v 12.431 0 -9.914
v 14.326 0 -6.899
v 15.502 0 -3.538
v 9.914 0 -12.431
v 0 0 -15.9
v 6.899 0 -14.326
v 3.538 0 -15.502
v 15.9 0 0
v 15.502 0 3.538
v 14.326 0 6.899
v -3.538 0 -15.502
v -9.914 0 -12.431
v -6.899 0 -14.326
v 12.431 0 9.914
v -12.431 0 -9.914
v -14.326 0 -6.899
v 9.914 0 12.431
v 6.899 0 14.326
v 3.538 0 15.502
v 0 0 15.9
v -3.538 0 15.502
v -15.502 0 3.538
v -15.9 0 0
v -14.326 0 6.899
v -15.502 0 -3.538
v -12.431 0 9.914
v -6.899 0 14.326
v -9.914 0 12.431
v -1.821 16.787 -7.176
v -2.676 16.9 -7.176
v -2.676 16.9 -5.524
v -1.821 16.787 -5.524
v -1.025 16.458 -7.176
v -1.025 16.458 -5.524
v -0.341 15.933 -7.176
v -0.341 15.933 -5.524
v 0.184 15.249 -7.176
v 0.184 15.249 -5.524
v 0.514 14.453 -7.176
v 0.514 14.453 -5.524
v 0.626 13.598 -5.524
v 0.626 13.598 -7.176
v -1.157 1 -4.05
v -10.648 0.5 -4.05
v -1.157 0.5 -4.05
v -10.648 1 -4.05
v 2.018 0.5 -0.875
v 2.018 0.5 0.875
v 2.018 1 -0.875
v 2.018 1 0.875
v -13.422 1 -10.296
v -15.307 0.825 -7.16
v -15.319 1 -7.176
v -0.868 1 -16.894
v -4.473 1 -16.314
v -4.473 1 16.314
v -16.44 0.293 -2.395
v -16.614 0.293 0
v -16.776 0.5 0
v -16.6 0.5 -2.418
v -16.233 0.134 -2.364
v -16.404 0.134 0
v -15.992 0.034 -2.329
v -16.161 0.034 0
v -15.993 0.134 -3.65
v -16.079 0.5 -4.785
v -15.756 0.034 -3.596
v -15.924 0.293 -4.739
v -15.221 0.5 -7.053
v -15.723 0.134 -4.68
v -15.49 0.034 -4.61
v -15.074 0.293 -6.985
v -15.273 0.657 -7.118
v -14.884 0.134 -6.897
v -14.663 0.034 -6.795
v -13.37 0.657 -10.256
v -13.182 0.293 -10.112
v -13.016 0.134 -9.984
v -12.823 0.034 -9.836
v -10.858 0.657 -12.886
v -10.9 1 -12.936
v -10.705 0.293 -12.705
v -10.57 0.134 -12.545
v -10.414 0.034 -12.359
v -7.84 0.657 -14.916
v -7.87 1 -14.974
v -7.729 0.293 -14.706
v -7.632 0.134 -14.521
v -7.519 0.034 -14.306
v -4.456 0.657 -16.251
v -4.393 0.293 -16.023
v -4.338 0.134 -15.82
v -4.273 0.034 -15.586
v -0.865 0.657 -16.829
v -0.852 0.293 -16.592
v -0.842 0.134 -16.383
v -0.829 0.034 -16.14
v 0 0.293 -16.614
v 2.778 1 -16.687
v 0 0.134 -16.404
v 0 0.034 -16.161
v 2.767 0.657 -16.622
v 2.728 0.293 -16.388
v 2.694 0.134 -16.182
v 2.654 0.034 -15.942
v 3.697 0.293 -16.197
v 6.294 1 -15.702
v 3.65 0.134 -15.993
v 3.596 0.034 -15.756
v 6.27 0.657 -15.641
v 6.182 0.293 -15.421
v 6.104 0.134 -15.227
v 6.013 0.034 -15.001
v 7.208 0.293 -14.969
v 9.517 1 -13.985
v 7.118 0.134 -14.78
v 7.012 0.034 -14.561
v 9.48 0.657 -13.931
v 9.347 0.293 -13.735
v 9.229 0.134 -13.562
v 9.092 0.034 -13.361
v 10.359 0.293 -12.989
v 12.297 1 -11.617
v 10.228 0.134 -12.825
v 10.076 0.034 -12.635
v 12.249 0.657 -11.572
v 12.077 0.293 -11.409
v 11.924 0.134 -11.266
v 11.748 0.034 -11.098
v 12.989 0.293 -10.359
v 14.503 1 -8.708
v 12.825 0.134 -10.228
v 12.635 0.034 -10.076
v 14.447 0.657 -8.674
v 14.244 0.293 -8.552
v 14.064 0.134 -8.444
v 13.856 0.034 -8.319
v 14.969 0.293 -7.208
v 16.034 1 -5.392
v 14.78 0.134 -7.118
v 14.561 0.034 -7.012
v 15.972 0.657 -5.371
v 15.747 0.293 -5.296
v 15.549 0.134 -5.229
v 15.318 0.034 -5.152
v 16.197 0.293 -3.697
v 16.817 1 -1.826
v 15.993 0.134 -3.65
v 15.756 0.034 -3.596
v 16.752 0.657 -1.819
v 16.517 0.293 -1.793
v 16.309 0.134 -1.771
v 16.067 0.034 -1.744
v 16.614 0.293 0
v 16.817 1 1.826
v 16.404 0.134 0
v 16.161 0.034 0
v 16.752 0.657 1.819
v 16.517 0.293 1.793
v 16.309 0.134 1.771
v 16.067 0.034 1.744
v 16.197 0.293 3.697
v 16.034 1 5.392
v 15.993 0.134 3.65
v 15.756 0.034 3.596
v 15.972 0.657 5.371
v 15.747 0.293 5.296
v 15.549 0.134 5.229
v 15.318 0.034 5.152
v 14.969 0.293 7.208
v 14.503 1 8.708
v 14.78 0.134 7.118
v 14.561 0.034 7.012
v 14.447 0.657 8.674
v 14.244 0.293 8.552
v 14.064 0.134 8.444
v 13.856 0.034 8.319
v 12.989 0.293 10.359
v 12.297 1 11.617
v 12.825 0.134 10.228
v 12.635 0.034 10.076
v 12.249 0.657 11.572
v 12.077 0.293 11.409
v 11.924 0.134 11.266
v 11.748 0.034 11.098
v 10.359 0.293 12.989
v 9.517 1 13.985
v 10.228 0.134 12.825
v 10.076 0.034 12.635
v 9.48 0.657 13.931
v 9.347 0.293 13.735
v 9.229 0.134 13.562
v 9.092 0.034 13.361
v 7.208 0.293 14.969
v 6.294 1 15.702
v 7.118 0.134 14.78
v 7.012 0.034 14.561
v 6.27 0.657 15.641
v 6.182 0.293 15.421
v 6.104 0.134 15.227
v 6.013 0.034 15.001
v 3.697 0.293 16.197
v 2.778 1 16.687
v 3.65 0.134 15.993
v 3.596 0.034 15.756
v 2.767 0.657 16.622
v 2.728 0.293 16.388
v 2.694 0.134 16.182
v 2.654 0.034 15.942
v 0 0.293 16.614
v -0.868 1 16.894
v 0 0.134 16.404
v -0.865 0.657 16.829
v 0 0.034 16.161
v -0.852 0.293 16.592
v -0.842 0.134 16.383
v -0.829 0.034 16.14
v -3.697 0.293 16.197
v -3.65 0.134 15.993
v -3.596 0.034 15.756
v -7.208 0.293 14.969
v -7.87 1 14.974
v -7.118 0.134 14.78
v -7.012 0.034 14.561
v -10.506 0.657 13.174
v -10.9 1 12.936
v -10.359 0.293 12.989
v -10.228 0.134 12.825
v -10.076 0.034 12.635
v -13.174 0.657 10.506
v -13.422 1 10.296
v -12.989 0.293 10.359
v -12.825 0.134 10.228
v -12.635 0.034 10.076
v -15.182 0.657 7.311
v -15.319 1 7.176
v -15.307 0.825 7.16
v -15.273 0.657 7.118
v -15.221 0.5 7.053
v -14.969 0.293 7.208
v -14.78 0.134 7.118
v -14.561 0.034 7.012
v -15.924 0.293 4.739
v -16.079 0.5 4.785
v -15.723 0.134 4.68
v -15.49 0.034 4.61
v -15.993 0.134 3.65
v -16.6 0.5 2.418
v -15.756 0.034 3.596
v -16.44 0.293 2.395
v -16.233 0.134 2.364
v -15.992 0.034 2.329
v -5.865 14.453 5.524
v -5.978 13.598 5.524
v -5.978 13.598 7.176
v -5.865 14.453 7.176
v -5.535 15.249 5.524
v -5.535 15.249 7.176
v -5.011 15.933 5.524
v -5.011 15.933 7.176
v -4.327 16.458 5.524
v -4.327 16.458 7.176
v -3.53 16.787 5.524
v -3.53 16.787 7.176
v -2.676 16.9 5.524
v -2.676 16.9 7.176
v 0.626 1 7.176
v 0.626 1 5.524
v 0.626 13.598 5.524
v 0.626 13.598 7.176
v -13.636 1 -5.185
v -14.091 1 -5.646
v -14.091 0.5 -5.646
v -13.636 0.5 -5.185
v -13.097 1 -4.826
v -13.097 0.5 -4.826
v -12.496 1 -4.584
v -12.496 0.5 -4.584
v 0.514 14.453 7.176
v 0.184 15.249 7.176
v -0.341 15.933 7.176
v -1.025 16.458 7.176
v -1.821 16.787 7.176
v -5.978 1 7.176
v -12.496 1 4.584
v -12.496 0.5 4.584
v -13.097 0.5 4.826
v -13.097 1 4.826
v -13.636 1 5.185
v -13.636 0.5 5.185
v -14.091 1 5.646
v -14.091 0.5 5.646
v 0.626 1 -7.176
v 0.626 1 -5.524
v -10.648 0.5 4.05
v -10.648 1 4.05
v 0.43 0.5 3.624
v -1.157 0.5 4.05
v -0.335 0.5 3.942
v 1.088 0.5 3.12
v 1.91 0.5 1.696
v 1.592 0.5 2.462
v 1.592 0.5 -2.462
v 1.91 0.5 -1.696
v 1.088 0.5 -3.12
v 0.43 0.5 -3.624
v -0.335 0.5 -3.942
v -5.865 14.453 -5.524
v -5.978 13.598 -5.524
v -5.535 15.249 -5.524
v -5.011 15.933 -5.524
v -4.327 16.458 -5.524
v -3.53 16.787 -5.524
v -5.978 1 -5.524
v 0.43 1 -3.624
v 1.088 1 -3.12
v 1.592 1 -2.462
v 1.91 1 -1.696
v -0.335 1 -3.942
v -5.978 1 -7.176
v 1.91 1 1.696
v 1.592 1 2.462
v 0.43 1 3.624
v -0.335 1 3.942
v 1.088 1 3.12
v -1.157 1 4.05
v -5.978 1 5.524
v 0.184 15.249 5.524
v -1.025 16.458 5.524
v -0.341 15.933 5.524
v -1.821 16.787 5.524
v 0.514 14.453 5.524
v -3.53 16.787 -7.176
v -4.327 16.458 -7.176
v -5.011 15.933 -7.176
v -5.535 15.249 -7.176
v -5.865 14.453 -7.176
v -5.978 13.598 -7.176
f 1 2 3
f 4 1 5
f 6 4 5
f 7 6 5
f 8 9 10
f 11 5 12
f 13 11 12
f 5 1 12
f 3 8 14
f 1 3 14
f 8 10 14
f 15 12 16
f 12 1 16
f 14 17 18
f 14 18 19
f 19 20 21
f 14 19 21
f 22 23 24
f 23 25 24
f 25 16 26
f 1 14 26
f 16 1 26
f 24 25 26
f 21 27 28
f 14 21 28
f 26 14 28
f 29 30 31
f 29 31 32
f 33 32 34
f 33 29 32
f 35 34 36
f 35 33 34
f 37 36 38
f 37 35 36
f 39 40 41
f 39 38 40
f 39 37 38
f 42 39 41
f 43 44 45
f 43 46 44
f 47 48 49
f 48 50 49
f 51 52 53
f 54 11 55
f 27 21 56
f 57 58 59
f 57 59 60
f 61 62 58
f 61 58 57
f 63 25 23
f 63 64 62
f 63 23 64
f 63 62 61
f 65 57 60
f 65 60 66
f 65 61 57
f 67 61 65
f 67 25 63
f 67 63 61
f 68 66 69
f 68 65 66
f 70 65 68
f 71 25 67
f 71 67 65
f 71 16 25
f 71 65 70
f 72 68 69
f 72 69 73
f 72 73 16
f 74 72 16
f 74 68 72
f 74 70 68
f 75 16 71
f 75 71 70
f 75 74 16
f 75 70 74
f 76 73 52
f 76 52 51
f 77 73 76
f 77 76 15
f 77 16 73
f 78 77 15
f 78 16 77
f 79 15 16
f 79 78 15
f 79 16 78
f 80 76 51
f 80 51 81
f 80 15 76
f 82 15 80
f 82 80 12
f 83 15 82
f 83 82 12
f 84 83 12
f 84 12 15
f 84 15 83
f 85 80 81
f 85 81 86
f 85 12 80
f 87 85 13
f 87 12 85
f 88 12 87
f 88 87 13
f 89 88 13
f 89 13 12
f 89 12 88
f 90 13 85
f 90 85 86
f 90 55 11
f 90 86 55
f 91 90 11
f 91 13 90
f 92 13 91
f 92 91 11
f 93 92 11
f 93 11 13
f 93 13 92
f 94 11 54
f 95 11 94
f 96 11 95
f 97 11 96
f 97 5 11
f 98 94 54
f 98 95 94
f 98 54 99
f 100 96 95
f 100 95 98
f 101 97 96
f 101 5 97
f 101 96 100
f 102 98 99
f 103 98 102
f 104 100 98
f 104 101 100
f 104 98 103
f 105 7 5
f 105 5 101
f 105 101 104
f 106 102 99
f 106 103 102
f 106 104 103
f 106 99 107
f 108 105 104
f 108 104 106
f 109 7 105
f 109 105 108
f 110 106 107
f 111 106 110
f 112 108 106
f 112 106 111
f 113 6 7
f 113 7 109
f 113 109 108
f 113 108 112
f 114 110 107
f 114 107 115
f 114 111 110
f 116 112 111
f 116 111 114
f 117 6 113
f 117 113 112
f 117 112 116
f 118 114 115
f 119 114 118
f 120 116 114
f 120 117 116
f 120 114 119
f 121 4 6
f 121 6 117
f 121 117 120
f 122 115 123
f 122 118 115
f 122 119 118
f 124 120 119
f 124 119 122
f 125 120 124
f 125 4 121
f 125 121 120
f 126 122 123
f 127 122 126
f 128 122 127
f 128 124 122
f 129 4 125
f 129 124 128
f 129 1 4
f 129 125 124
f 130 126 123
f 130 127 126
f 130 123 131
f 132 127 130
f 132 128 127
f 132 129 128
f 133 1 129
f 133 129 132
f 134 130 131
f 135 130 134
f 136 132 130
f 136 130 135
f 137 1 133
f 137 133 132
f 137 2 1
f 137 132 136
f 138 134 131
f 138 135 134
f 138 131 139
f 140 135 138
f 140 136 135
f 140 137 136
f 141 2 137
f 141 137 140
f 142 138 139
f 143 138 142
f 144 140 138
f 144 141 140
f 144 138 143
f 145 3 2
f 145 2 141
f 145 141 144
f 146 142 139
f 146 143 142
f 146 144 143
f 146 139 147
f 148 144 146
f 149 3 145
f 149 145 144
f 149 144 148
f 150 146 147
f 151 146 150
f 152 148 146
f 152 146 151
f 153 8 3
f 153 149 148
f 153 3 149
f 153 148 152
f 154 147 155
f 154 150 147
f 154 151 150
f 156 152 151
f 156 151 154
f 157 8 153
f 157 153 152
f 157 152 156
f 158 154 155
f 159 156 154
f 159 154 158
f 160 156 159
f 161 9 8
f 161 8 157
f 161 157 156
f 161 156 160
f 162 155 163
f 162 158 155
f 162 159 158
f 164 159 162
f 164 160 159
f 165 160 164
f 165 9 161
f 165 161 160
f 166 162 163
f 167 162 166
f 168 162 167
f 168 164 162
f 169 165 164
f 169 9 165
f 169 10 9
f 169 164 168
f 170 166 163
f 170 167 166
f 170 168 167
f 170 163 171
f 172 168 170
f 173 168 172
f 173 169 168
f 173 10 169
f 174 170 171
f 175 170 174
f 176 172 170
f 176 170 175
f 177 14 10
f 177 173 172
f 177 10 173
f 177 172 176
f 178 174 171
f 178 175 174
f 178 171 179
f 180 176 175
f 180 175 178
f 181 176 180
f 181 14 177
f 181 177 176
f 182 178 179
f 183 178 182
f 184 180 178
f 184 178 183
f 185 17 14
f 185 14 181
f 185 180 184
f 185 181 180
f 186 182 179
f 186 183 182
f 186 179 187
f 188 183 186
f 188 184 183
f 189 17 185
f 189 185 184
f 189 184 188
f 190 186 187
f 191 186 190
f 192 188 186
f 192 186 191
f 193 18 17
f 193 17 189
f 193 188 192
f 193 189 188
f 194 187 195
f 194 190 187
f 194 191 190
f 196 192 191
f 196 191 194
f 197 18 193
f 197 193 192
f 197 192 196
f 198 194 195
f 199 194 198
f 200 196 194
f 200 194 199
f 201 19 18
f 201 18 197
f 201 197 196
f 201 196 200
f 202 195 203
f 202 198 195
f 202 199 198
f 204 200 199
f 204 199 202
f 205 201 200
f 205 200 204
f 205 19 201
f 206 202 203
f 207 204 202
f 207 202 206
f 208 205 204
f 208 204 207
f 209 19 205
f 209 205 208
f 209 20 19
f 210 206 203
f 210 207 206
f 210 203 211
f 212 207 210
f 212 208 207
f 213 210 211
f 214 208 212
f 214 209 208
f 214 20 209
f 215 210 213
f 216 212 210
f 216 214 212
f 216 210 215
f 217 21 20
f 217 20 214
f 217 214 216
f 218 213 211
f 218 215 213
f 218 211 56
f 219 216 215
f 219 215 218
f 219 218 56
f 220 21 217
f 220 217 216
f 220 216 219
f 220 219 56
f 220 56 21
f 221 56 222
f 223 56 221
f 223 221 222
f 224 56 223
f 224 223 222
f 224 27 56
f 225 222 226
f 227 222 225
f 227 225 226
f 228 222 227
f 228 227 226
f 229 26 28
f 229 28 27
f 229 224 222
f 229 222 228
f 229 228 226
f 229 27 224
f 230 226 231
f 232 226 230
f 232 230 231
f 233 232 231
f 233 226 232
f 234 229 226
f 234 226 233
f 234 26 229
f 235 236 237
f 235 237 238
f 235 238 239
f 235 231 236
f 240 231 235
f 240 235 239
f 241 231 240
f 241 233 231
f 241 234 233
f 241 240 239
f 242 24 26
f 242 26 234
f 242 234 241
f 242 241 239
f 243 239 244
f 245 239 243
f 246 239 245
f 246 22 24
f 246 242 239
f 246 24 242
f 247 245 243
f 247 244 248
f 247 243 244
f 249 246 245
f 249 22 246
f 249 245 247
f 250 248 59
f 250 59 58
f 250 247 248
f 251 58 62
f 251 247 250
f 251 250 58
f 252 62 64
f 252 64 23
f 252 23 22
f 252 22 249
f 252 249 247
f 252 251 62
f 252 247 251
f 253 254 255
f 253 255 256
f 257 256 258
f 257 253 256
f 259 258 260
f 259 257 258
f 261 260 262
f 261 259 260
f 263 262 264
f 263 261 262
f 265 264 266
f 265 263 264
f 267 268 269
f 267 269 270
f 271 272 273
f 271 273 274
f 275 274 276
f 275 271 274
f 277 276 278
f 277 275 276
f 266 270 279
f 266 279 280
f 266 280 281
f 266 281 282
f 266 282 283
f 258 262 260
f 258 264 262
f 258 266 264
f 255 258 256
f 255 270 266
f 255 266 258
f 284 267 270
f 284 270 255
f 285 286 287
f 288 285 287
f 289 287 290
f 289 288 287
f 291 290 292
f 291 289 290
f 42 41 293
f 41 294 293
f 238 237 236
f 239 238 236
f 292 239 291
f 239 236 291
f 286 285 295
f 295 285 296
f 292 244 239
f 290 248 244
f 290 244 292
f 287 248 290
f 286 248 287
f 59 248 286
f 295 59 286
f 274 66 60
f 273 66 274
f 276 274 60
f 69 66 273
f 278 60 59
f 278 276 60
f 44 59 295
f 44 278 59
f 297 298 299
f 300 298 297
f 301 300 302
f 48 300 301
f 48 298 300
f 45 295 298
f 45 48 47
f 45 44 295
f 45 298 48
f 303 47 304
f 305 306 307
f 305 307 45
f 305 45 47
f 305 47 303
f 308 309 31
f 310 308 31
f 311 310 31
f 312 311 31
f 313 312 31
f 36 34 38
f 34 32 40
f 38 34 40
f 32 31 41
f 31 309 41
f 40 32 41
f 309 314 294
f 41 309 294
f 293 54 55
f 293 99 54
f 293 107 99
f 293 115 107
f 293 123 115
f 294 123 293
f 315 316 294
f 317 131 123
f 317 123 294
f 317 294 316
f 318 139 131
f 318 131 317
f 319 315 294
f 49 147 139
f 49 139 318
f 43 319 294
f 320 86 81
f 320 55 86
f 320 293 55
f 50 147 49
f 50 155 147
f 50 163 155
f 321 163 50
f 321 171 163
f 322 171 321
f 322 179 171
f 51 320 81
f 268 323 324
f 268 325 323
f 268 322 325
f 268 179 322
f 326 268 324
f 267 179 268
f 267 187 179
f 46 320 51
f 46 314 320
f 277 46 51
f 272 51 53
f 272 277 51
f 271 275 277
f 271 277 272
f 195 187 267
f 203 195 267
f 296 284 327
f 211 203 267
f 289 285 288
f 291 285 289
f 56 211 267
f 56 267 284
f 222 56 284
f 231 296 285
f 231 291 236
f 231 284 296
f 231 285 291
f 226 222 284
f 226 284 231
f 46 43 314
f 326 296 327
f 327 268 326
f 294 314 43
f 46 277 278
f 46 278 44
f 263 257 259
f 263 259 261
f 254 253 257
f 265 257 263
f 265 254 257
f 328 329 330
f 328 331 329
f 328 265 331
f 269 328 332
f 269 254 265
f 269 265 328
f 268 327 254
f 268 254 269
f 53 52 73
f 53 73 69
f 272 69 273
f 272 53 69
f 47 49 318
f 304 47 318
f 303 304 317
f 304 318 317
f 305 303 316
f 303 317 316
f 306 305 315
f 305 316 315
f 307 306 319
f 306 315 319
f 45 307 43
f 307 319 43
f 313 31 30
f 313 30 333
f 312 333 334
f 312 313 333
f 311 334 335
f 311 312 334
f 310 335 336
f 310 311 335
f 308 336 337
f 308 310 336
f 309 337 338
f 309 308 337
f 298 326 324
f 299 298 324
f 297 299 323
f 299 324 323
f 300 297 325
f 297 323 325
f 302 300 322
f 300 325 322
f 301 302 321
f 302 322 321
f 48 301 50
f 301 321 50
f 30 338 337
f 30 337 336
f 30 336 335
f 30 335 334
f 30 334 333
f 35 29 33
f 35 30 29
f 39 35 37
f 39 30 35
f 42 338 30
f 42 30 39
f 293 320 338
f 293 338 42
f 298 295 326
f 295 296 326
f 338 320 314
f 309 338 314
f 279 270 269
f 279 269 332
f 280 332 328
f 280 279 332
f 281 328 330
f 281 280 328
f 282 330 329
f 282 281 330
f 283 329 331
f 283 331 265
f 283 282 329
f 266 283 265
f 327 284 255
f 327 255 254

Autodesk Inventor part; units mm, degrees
ref_plane "YZ Plane" through (0, 0, 0) normal (1, 0, 0) x (0, 1, 0)
ref_plane "XZ Plane" through (0, 0, 0) normal (0, 1, 0) x (-1, 0, 0)
ref_plane "XY Plane" through (0, 0, 0) normal (0, 0, 1) x (1, 0, 0)
sketch "Sketch1" plane through (0, 0, 0) normal (0, 1, 0) x (-1, 0, 0)
  circle A0 centre (0, 0) radius 16.9164
  dimension "d0" = 33.8328
extrude "Extrusion1" add sketch "Sketch1" along normal blind 1
fillet "Fillet1" radius 1.016 1 edges at (16.9164, 0, 0)
sketch "Sketch2" plane through (0, 1, 0) normal (0, 1, 0) x (1, 0, 0)
  circle A0 centre (0, 0) radius 16.9164 projected
  line L0 (-0.1238, 7.1755) -> (0.6262, 7.1755) construction
  line L1 (-0.1238, 7.1755) -> (-0.8738, 7.1755) construction
  line L2 (0.6262, 7.1755) -> (-5.9778, 7.1755) construction
  line L3 (-5.9778, 7.1755) -> (-5.9778, 5.5245)
  line L4 (-5.9778, 5.5245) -> (0.6262, 5.5245)
  line L5 (0.6262, 5.5245) -> (0.6262, 7.1755)
  line L6 (0.6262, -7.1755) -> (-5.9778, -7.1755)
  line L7 (-5.9778, -7.1755) -> (-5.9778, -5.5245)
  line L8 (-5.9778, -5.5245) -> (0.6262, -5.5245)
  line L9 (0.6262, -5.5245) -> (0.6262, -7.1755)
  line L10 (0.6262, 6.35) -> (-5.9778, 6.35) construction
  line L11 (0.6262, -6.35) -> (-5.9778, -6.35) construction
  line L12 (-5.9778, 7.1755) -> (0.6262, 7.1755)
  line L13 (-2.6758, 6.35) -> (-2.6758, 16.7034) construction
  line L14 (-2.6758, -6.35) -> (-2.6758, -16.7034) construction
  line L15 (-5.9778, 7.1755) -> (-15.3192, 7.1755) construction
  line L16 (-5.9778, -7.1755) -> (-15.3192, -7.1755) construction
  line L17 (-15.3192, 7.1755) -> (-14.0913, 5.6461)
  line L18 (-12.4965, 4.5835) -> (-10.6485, 4.0497)
  line L19 (-10.6485, 4.0497) -> (-1.1572, 4.0497)
  line L20 (-10.6485, 4.0497) -> (-13.4621, 4.8624) construction
  line L21 (-13.4621, 4.8624) -> (-15.3192, 7.1755) construction
  line L22 (2.0178, 0.8747) -> (2.0178, 0)
  line L23 (2.0178, 0) -> (-20.8537, 0) construction
  line L24 (-15.3192, -7.1755) -> (-14.0913, -5.6461)
  line L25 (-12.4965, -4.5835) -> (-10.6485, -4.0497)
  line L26 (-10.6485, -4.0497) -> (-1.1572, -4.0497)
  line L27 (-10.6485, -4.0497) -> (-13.4621, -4.8624) construction
  line L28 (2.0178, -0.8747) -> (2.0178, 0)
  arc A1 (2.0178, 0.8747) -> (-1.1572, 4.0497) centre (-1.1572, 0.8747) ccw
  arc A2 (-1.1572, -4.0497) -> (2.0178, -0.8747) centre (-1.1572, -0.8747) ccw
  arc A3 (-14.0913, 5.6461) -> (-12.4965, 4.5835) centre (-11.6155, 7.6338) ccw
  arc A4 (-12.4965, -4.5835) -> (-14.0913, -5.6461) centre (-11.6155, -7.6338) ccw
  point P0 (-0.1238, -4.822)
  point P1 (-13.4621, 4.8624)
  point P2 (2.0178, 4.0497)
  point P3 (-13.4621, -4.8624)
  point P4 (2.0178, -4.0497)
  dimension "d17" = 6.604
  dimension "d18" = 1.651
  dimension "d20" = 12.7
  dimension "d21" = 6.604
  dimension "d22" = 1.651
  dimension "d28" = 3.175
sketch "Sketch3" plane through (0, 1, 0) normal (0, 1, 0) x (1, 0, 0)
  point P0 (0, 0)
extrude "Extrusion2" add sketch "Sketch2" along normal blind 15.9 contours L6 L7 L8 L9
extrude "Extrusion3" add sketch "Sketch2" along normal blind 15.9 contours L12 L5 L4 L3
fillet "Fillet2" radius 3.302 4 edges at (-5.9778, 16.9, 6.35) (0.6262, 16.9, 6.35) (-5.9778, 16.9, -6.35) (0.6262, 16.9, -6.35)
extrude "Extrusion4" cut sketch "Sketch2" against normal blind 0.5 contours L17 A3 L18 L19 A1 L22 L28 A2 L26 L25 A4 L24 A0 picked at (-4.321, -1.3499)
properties part number "Replacemnet part(wall socket)"
